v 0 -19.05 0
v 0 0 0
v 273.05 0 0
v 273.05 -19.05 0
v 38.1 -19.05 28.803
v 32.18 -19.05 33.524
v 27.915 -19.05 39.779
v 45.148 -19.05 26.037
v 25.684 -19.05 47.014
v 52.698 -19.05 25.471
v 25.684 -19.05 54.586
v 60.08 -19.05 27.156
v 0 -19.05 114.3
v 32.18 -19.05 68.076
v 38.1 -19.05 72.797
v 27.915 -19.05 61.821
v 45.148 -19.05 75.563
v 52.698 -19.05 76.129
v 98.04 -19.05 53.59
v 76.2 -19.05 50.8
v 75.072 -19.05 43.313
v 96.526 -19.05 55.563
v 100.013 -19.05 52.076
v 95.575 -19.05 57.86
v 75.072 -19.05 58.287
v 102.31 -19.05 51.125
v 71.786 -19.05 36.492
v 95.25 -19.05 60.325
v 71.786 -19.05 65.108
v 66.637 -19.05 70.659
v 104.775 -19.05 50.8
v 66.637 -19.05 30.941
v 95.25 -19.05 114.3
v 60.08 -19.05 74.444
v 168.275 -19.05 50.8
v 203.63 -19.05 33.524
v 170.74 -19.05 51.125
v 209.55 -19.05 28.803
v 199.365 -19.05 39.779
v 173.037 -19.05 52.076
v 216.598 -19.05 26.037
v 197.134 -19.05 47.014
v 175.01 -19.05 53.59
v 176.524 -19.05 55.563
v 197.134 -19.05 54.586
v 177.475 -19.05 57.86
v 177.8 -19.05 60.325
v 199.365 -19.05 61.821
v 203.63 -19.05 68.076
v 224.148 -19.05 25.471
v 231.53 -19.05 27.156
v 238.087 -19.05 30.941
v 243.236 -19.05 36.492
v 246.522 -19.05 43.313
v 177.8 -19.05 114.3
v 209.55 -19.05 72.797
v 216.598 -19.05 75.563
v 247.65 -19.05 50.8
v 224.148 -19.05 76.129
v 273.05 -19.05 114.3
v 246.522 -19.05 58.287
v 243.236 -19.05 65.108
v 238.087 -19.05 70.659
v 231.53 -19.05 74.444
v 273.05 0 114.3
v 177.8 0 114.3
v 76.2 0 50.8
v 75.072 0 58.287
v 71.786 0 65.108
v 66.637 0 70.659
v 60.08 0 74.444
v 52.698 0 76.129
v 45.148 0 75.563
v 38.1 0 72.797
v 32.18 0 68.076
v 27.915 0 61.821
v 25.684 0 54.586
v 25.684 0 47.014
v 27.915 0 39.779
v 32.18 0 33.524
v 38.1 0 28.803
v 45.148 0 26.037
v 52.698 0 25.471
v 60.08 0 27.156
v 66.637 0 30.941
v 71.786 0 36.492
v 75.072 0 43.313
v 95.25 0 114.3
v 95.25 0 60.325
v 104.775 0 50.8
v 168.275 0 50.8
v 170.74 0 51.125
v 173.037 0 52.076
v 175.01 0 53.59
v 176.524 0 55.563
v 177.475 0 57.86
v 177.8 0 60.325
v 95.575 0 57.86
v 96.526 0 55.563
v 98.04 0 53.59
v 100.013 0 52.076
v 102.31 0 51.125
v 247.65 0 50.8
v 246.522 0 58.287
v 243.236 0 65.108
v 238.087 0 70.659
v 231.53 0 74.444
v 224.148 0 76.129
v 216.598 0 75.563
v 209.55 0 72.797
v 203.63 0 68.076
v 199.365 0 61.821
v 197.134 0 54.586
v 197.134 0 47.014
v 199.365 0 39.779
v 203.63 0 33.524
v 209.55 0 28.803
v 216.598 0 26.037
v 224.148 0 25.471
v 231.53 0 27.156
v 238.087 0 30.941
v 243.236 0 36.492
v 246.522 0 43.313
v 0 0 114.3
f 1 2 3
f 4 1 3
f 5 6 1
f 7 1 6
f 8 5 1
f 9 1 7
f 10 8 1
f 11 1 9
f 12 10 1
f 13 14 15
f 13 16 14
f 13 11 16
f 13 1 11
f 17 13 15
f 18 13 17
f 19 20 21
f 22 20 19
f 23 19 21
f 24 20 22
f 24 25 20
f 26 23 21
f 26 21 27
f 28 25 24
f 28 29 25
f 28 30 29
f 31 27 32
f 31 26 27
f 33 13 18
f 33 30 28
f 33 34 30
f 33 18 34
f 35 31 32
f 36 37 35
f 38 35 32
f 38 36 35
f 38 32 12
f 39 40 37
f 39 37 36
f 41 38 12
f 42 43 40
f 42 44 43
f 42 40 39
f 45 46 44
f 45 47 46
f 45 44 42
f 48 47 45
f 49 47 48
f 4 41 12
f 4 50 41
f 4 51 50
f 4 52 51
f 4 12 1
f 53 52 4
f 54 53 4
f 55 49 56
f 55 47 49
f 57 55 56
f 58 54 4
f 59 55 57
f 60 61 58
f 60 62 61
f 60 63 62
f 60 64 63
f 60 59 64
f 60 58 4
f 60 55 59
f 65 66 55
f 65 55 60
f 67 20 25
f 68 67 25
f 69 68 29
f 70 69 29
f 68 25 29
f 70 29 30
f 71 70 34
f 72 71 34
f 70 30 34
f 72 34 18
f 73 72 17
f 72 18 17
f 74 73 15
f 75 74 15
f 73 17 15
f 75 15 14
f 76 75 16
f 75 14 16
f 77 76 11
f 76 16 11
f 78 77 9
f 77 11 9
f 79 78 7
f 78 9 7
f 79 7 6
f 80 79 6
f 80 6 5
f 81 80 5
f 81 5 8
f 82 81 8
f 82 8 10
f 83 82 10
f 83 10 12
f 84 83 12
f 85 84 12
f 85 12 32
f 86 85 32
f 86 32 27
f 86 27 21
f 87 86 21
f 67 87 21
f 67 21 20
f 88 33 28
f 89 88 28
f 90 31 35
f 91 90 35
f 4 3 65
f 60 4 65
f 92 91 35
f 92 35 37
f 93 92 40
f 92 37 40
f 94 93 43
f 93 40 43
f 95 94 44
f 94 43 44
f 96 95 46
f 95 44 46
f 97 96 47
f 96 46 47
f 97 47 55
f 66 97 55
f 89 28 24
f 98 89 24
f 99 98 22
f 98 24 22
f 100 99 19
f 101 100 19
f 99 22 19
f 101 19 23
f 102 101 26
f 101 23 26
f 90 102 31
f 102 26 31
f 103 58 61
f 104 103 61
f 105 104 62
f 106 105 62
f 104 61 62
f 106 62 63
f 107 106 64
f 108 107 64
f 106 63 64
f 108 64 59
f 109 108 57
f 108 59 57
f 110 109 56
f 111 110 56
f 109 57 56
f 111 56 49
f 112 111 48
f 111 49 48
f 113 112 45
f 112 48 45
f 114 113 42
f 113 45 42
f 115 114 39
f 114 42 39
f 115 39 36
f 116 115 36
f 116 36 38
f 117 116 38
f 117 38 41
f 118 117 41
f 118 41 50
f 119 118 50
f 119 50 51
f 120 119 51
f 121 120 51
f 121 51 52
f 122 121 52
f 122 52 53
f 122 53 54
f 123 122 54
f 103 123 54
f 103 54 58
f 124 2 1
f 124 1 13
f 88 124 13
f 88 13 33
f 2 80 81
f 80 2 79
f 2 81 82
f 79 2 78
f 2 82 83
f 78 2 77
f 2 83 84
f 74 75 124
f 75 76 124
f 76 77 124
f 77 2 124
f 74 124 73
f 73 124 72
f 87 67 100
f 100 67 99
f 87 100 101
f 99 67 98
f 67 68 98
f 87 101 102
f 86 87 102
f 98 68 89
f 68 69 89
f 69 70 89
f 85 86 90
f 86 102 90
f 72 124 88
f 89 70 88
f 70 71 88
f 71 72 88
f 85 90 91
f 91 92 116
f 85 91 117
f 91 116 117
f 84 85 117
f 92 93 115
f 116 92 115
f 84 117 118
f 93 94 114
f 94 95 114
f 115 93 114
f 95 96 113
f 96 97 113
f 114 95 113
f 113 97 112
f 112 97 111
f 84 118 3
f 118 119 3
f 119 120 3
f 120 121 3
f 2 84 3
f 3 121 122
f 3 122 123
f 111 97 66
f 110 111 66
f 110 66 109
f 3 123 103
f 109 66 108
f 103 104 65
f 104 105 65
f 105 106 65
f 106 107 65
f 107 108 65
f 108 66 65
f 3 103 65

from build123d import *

# Parameters (mm, degrees)
F0_W     = 273.05
F0_H     = 114.3
F1_DEPTH = 19.05
F2_R     = 25.4
F3_DEPTH = 25.4
F5_DEPTH = 25.4


with BuildPart() as f1:
    # F0 (on Front) → F1 (new body)
    with BuildSketch(Plane.XZ):
        with Locations((136.525, 57.15)):
            Rectangle(F0_W, F0_H)
    extrude(amount=F1_DEPTH)

    # F2 (on face) → F3 (cut)
    with BuildSketch(Plane.XZ.offset(19.05)):
        with Locations((50.8, 50.8)):
            Circle(F2_R)
        with Locations((222.25, 50.8)):
            Circle(F2_R)
    extrude(amount=-F3_DEPTH, mode=Mode.SUBTRACT)

    # F4 (on face) → F5 (cut)
    with BuildSketch(Plane.XZ.offset(19.05)):
        with BuildLine():
            Line((177.8, 114.3), (95.25, 114.3))
            Line((95.25, 114.3), (95.25, 60.325))
            ThreePointArc((95.25, 60.325), (98.039808, 53.589808), (104.775, 50.8))
            Line((104.775, 50.8), (168.275, 50.8))
            ThreePointArc((168.275, 50.8), (175.010192, 53.589808), (177.8, 60.325))
            Line((177.8, 60.325), (177.8, 114.3))
        make_face()
    extrude(amount=-F5_DEPTH, mode=Mode.SUBTRACT)


solid = f1.part
